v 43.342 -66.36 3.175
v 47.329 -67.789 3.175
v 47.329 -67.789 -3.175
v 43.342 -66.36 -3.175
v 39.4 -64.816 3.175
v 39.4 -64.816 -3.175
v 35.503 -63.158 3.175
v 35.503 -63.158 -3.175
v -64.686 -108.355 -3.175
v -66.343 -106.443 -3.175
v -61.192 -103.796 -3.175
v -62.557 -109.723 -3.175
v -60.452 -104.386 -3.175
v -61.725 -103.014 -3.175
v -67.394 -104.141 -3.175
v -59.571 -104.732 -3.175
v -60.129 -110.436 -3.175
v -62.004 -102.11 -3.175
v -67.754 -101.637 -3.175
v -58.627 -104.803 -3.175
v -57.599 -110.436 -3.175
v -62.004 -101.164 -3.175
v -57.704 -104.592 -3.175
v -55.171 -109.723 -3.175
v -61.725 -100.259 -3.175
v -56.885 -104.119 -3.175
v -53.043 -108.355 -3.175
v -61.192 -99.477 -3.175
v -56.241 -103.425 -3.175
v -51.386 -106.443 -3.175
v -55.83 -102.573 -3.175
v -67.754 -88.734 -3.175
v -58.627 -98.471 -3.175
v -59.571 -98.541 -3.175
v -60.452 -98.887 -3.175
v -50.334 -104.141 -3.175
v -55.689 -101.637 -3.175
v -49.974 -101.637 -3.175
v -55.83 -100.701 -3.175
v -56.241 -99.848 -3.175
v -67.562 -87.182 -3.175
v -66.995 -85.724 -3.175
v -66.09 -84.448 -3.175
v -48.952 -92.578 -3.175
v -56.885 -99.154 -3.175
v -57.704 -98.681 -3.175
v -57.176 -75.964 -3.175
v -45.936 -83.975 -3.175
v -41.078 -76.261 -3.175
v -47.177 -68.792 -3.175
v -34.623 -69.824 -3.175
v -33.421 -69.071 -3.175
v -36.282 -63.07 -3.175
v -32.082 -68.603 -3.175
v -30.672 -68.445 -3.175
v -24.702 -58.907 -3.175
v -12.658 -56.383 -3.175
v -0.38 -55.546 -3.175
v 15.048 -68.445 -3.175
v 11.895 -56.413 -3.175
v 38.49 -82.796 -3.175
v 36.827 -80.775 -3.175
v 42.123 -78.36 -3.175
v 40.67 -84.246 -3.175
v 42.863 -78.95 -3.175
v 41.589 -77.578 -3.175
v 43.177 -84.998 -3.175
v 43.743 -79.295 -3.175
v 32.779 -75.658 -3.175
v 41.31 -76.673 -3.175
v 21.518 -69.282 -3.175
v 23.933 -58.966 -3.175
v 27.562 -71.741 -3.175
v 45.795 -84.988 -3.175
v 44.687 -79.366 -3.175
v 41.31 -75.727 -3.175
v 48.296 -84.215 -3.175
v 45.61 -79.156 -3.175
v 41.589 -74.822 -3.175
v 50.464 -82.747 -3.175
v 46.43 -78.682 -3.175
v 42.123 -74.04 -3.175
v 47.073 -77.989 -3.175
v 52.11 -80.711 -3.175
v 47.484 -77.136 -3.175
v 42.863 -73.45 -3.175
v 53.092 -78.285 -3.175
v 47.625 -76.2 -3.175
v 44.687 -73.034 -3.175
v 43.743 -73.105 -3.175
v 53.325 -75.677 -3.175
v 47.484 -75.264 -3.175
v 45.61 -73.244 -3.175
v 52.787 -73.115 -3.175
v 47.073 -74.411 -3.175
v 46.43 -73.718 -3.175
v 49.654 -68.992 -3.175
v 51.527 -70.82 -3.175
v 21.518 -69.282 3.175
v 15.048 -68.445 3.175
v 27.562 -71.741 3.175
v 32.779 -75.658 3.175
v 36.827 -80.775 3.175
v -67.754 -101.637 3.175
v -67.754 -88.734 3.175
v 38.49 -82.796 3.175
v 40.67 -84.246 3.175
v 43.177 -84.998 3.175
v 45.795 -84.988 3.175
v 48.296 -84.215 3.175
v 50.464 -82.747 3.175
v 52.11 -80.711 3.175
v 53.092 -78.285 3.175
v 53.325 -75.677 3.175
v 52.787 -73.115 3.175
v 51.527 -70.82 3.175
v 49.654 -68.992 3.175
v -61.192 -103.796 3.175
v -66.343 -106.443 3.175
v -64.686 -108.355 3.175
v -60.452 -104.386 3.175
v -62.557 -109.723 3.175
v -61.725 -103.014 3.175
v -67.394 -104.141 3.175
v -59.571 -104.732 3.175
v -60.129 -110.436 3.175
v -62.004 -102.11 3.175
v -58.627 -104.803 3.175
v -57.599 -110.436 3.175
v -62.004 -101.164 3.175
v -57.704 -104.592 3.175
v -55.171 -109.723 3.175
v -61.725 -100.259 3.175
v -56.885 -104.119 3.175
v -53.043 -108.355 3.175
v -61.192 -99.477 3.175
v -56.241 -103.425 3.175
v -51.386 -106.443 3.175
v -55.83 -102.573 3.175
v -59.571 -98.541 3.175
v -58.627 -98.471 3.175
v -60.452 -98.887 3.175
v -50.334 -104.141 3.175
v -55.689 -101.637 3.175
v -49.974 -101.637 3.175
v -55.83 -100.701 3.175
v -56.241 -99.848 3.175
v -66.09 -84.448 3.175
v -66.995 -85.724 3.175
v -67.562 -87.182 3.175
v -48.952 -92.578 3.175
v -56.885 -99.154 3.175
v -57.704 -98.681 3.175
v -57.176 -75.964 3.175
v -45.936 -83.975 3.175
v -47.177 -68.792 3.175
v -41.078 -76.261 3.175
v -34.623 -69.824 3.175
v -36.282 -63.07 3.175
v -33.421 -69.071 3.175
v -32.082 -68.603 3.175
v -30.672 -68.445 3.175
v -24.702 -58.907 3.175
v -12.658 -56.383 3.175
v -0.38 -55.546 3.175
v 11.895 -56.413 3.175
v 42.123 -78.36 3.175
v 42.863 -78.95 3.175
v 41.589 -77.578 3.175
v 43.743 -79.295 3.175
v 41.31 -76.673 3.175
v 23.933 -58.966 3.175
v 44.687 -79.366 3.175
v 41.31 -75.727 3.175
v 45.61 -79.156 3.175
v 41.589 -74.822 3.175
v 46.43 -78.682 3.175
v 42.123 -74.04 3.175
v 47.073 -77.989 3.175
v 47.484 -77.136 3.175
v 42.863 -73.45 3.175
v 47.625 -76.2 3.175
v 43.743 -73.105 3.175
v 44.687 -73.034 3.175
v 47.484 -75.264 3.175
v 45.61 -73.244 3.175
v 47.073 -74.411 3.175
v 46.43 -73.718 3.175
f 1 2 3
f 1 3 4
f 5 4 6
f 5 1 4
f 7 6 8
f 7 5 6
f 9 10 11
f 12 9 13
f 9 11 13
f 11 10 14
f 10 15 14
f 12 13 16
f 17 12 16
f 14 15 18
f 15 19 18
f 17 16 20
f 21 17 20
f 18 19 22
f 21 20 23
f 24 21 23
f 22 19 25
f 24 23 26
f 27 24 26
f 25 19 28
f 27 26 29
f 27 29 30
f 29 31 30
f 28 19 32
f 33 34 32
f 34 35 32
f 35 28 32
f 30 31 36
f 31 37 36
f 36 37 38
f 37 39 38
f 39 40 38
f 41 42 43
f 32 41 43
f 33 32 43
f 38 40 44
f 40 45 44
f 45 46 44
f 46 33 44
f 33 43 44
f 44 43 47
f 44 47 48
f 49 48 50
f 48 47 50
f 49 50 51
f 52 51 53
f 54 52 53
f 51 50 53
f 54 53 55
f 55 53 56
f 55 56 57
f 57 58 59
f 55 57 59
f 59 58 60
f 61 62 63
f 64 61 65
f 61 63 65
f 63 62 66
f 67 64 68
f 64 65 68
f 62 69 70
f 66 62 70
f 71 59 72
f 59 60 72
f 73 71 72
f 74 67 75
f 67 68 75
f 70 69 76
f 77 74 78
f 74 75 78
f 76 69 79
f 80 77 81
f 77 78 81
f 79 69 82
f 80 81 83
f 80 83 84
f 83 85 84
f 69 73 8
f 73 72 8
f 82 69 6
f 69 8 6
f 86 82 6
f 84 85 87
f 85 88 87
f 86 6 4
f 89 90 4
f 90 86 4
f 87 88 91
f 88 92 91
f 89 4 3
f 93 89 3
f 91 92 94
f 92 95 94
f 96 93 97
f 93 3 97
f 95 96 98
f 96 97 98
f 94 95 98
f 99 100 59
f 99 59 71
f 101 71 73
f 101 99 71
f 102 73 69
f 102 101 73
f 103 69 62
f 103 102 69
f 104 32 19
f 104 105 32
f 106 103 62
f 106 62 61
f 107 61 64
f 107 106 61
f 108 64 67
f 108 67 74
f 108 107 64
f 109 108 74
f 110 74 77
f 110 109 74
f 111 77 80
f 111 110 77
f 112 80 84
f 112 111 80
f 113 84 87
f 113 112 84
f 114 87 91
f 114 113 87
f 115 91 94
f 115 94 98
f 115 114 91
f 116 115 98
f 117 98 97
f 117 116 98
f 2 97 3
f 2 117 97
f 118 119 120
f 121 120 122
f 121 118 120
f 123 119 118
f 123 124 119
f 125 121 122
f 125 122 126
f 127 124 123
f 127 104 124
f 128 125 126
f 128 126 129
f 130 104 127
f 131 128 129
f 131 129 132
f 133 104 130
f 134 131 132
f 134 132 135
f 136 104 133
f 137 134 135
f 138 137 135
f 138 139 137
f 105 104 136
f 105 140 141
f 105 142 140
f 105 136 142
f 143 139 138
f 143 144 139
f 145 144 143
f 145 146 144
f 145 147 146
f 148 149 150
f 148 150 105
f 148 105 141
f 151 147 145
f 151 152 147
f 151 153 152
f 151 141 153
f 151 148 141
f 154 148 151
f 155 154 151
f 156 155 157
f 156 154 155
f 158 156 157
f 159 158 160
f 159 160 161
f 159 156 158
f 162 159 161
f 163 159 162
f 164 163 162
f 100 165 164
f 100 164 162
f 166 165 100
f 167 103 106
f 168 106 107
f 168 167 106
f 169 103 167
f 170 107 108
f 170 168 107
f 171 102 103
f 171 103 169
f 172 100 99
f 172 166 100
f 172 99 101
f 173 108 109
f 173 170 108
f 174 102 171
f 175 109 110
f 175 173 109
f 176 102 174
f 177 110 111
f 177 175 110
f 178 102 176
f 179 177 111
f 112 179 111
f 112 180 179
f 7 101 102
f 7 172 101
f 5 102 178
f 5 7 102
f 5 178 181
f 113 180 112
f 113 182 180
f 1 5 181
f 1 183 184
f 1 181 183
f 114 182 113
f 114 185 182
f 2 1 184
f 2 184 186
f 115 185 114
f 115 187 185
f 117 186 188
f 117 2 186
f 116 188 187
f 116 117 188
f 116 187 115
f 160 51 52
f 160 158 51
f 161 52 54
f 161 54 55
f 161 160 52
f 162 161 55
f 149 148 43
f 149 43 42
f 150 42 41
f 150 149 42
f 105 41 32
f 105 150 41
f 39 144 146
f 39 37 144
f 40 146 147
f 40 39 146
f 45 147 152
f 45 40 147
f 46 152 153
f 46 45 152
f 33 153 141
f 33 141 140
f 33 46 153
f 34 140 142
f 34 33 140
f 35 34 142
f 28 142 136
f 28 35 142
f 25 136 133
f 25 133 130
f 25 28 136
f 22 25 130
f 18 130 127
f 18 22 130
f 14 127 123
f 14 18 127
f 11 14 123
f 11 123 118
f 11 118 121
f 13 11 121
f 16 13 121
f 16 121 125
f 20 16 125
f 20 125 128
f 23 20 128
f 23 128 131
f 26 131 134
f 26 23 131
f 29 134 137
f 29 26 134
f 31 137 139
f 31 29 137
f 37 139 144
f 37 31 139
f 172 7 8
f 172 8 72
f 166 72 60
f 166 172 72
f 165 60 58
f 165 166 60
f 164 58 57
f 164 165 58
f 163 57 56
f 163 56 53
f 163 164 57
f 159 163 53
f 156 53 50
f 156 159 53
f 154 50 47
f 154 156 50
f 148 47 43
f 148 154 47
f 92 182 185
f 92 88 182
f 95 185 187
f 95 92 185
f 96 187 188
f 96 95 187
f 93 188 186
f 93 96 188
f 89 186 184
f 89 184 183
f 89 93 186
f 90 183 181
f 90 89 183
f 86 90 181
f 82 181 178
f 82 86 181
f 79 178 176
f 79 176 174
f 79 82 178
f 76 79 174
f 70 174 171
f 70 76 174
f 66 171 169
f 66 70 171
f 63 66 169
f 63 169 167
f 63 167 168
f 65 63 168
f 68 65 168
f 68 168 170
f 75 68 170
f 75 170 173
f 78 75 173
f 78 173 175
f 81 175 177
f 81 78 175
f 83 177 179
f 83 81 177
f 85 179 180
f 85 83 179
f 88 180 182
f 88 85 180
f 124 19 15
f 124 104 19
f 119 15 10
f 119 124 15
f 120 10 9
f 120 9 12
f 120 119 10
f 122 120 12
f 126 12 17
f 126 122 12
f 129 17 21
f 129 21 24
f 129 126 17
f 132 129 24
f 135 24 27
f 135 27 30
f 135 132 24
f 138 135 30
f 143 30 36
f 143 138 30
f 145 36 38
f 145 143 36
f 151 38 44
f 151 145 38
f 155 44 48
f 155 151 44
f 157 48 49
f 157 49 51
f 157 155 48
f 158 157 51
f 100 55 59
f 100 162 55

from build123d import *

# Parameters (mm, degrees)
SKETCH1_R      = 3.175
EXTRUDE1_DEPTH = 3.175


with BuildPart() as part:
    # Sketch1 → Extrude1 (new, symmetric)
    with BuildSketch(Plane.XY):
        with BuildLine():
            Line((-30.671954233, -68.444522869), (15.048045767, -68.444522869))
            ThreePointArc((15.048045767, -68.444522869), (27.561669737, -71.74092101), (36.827271125, -80.774505929))
            ThreePointArc((36.827271125, -80.774505929), (51.362538063, -81.790073124), (47.328528799, -67.788925636))
            ThreePointArc((47.328528799, -67.788925636), (41.365390525, -65.602009691), (35.503100856, -63.157591707))
            ThreePointArc((35.503100856, -63.157591707), (-18.723497615, -57.436104054), (-66.09004738, -84.448496879))
            ThreePointArc((-66.09004738, -84.448496879), (-67.32359299, -86.435368185), (-67.754245932, -88.734026577))
            Line((-67.754245932, -88.734026577), (-67.754245932, -101.636771367))
            ThreePointArc((-67.754245932, -101.636771367), (-58.864245932, -110.526771367), (-49.974245932, -101.636771367))
            ThreePointArc((-49.974245932, -101.636771367), (-45.935885769, -83.975243651), (-34.623381697, -69.82373611))
            ThreePointArc((-34.623381697, -69.82373611), (-32.764560752, -68.799233221), (-30.671954233, -68.444522869))
        make_face()
        with Locations((44.45, -76.2)):
            Circle(SKETCH1_R, mode=Mode.SUBTRACT)
        with Locations((-58.864245932, -101.636771367)):
            Circle(SKETCH1_R, mode=Mode.SUBTRACT)
    extrude(amount=EXTRUDE1_DEPTH, both=True)


solid = part.part
